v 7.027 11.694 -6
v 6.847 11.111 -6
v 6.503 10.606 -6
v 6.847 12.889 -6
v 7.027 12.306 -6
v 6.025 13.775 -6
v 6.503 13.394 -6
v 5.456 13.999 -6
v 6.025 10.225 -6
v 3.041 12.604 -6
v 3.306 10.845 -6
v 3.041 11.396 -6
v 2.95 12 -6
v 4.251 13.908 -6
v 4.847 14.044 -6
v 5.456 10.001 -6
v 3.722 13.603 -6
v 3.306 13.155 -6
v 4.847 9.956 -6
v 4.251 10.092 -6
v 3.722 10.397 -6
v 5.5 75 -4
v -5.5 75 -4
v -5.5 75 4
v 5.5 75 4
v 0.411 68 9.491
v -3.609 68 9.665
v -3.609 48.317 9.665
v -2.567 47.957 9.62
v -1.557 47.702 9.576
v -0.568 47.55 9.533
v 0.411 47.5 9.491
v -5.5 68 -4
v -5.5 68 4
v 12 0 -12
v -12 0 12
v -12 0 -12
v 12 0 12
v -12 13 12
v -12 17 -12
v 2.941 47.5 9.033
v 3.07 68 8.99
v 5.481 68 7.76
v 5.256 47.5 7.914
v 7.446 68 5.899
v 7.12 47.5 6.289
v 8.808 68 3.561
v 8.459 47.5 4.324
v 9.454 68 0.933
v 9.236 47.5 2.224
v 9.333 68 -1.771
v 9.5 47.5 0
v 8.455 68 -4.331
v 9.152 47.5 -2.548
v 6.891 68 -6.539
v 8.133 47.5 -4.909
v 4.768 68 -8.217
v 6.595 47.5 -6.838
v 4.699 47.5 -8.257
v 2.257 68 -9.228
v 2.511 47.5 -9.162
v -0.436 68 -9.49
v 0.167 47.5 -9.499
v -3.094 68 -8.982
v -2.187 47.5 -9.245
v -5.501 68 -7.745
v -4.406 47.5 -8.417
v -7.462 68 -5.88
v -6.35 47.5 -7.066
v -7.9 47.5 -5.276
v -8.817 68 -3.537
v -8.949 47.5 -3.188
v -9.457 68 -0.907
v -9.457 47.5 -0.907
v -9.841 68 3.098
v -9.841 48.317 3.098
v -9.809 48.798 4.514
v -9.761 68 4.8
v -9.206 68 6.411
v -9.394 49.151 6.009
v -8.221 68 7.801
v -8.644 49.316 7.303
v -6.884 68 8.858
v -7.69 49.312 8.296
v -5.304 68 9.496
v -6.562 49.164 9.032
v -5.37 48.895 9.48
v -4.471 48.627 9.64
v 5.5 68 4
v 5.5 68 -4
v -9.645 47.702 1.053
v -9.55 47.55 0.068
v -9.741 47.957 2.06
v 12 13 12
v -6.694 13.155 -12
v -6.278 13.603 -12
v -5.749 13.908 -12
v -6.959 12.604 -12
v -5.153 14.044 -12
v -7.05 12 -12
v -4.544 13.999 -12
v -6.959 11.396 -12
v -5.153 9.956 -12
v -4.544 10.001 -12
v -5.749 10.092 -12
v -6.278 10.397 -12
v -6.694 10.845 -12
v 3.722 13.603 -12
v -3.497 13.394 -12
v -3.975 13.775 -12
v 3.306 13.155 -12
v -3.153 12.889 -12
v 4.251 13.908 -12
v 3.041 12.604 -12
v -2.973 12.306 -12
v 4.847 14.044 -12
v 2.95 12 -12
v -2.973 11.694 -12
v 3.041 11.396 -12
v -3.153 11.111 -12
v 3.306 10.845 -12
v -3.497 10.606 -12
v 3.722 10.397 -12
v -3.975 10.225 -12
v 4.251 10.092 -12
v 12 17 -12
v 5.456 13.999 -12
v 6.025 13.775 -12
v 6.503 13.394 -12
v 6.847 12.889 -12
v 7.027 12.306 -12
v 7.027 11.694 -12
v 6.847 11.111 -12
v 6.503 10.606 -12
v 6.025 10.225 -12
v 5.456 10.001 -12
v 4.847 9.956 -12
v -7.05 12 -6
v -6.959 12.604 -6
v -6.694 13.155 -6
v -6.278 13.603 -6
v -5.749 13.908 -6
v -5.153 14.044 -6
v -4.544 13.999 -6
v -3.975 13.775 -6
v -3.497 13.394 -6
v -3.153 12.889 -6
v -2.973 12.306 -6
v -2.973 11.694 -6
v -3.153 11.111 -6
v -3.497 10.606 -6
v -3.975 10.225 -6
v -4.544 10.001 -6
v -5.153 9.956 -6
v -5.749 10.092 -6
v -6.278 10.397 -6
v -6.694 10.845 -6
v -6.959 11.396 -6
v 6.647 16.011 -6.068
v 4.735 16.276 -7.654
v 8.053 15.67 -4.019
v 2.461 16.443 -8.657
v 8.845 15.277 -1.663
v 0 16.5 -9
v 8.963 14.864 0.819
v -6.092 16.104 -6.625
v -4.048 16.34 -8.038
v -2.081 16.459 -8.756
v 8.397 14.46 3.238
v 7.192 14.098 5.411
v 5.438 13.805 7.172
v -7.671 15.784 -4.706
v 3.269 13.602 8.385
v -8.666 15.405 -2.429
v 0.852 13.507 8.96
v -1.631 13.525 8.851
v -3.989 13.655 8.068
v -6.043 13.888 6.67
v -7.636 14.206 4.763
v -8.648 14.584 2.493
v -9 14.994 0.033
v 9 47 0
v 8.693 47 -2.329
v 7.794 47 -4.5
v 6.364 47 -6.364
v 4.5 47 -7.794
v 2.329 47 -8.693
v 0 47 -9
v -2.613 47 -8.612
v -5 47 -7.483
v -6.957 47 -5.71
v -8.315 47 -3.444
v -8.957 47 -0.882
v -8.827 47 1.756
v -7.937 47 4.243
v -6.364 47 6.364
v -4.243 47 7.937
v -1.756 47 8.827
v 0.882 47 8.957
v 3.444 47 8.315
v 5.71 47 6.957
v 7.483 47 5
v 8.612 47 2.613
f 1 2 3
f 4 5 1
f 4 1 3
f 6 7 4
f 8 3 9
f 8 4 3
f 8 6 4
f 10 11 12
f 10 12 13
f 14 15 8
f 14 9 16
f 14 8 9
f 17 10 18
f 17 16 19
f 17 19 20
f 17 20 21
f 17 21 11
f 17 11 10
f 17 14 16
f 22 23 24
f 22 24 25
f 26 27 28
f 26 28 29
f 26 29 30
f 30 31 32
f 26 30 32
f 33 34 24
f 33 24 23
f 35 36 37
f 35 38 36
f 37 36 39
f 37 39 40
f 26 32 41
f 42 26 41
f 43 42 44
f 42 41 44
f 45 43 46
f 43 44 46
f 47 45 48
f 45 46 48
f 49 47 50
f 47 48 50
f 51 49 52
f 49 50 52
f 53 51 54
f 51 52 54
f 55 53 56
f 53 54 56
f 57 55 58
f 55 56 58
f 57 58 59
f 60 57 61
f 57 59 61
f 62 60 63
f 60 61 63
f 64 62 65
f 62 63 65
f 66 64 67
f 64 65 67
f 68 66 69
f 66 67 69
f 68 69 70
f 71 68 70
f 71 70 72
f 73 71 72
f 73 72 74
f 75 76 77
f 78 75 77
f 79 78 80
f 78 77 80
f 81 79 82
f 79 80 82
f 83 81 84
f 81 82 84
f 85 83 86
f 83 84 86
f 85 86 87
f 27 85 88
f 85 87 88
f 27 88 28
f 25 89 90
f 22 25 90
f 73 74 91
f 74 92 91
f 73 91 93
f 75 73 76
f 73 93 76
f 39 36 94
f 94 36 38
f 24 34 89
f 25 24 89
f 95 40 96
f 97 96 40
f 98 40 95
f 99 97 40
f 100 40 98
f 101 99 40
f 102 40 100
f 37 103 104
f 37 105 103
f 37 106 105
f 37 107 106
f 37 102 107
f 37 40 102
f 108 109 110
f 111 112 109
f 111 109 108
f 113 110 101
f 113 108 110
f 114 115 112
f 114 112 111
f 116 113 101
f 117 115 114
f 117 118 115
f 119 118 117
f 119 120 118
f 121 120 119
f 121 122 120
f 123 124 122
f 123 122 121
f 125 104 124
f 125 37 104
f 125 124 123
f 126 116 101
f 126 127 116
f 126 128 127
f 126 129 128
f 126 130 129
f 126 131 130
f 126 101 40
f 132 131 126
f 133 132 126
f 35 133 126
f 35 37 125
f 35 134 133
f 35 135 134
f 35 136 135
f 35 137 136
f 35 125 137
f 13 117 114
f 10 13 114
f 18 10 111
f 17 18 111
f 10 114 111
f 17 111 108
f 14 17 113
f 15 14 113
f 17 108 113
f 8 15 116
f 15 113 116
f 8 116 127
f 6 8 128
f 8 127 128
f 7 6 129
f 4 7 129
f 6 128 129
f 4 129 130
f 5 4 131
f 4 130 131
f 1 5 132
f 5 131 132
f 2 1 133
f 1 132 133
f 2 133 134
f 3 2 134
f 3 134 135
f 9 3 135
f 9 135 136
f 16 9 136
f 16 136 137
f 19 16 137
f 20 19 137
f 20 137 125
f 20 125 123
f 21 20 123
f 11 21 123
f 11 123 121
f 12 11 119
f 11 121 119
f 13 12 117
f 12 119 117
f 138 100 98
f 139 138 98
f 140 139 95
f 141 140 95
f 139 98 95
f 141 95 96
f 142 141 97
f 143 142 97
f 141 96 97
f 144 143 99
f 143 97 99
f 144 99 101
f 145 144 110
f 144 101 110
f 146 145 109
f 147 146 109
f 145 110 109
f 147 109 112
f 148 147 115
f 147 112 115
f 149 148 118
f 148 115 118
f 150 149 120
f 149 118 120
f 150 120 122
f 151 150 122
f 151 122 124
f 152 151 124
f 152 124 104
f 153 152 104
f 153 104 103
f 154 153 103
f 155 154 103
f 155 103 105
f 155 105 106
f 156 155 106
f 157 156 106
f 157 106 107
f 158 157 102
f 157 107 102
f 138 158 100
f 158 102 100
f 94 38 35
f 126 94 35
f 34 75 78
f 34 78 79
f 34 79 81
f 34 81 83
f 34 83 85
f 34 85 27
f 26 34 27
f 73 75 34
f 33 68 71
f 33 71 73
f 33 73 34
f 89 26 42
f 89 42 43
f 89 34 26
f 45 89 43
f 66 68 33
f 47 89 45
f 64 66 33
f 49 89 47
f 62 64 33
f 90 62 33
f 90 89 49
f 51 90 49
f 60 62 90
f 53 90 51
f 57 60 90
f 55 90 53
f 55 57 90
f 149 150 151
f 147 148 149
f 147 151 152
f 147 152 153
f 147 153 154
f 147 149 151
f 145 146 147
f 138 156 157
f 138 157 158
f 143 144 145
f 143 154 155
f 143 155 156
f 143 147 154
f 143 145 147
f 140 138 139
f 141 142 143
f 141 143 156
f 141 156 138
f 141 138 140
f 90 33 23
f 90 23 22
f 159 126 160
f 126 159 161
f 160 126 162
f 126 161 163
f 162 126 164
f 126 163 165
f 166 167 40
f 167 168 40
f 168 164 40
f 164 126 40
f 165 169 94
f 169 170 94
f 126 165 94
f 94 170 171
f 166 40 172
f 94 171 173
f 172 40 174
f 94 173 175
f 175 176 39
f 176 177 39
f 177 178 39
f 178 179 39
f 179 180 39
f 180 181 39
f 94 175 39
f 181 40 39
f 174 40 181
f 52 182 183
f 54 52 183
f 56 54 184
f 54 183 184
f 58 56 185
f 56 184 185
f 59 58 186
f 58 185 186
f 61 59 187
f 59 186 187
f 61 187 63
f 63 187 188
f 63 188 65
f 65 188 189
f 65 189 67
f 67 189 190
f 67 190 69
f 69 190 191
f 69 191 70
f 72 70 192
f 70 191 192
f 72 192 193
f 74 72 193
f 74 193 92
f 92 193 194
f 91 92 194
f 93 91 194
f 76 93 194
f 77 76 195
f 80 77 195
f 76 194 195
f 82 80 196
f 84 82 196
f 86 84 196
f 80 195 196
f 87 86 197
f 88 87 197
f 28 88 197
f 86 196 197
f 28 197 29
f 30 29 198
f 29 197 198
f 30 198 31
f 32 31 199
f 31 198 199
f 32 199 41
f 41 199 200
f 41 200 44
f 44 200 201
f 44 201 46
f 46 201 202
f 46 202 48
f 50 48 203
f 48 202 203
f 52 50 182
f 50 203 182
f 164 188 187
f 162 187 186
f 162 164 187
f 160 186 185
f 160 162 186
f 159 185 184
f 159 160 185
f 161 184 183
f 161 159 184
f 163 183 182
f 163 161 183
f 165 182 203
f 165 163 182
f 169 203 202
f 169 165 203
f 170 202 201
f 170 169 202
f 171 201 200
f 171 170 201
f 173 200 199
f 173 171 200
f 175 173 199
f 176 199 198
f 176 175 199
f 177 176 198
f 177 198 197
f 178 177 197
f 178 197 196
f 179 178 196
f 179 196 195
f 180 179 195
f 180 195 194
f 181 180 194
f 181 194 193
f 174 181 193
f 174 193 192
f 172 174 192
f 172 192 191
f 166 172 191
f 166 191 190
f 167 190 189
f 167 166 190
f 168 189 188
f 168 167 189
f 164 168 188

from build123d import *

# Parameters (mm, degrees)
SKETCH1_W           = 24
SKETCH1_H           = 24
BOSS_EXTRUDE1_DEPTH = 17
CUT_EXTRUDE1_DEPTH  = 32.764760349
SKETCH3_R           = 9
BOSS_EXTRUDE2_DEPTH = 52
BOSS_EXTRUDE3_DEPTH = 16
CHAMFER1_START      = 46.9999999
CHAMFER1_OUTLINE_R  = 9
CHAMFER1_DEPTH      = 5.0000001
SKETCH5_W           = 11
SKETCH5_H           = 8
BOSS_EXTRUDE4_DEPTH = 7
SKETCH6_R           = 2.05
CUT_EXTRUDE2_DEPTH  = 6


with BuildPart() as part:
    # Sketch1 → Boss-Extrude1 (new body)
    with BuildSketch(Plane(origin=(0, 0, 0), x_dir=(1, 0, 0), z_dir=(0, 1, 0))):
        Rectangle(SKETCH1_W, SKETCH1_H)
    extrude(amount=BOSS_EXTRUDE1_DEPTH)

    # Sketch2 → Cut-Extrude1 (cut, through all)
    with BuildSketch(Plane.ZY.offset(12)):
        Polygon((-12, 17), (12, 13), (12, 17), align=None)
    extrude(amount=-CUT_EXTRUDE1_DEPTH, mode=Mode.SUBTRACT)

    # Sketch3 → Boss-Extrude2 (add)
    with BuildSketch(Plane.XZ):
        with Locations(Location((0, 0, 0), (0, 0, 270))):
            Circle(SKETCH3_R)
    extrude(amount=-BOSS_EXTRUDE2_DEPTH)

    # Sketch4 → Boss-Extrude3 (add)
    with BuildSketch(Plane(origin=(0, 52, 0), x_dir=(1, 0, 0), z_dir=(0, 1, 0))):
        with BuildLine():
            Line((-9.456572951, 0.90731914), (-9.84083402, -3.097658461))
            ThreePointArc((-9.84083402, -3.097658461), (-8.220587121, -7.800746053), (-3.608813676, -9.665090067))
            Line((-3.608813676, -9.665090067), (0.410792593, -9.491114236))
            ThreePointArc((0.410792593, -9.491114236), (6.891182028, 6.539236214), (-9.456572951, 0.90731914))
        make_face()
    extrude(amount=BOSS_EXTRUDE3_DEPTH)

    # Chamfer1: read off the stored shape, not the designer's step
    # Chamfer1 outline → Chamfer1 (add)
    with BuildSketch(Plane(origin=(0, 0, 0), x_dir=(1, 0, 0), z_dir=(0, 1, 0)).offset(CHAMFER1_START)):
        with BuildLine():
            ThreePointArc((-9.84083402, -3.097658461), (-8.220587121, -7.800746053), (-3.608813676, -9.665090067))
            Line((-3.608813676, -9.665090067), (0.410792593, -9.491114236))
            ThreePointArc((0.410792593, -9.491114236), (6.891182028, 6.539236214), (-9.456572951, 0.90731914))
            Line((-9.456572951, 0.90731914), (-9.84083402, -3.097658461))
        make_face()
        Circle(CHAMFER1_OUTLINE_R, mode=Mode.SUBTRACT)
    extrude(amount=CHAMFER1_DEPTH)

    # Chamfer1 2 outline → Chamfer1 2 (revolve, cut)
    with BuildSketch(Plane.XY):
        Polygon((11.332682454, 49.332682454), (9, 47), (11.332682454, 46.9999999), align=None)
    revolve(axis=Axis((0, 0, 0), (0, 1, 0)), mode=Mode.SUBTRACT)

    # Sketch5 → Boss-Extrude4 (add)
    with BuildSketch(Plane(origin=(0, 68, 0), x_dir=(1, 0, 0), z_dir=(0, 1, 0))):
        Rectangle(SKETCH5_W, SKETCH5_H)
    extrude(amount=BOSS_EXTRUDE4_DEPTH)

    # Sketch6 → Cut-Extrude2 (cut)
    with BuildSketch(Plane(origin=(0, 0, -12), x_dir=(-1, 0, 0), z_dir=(0, 0, -1))):
        with Locations((5, 12)):
            Circle(SKETCH6_R)
        with Locations((-5, 12)):
            Circle(SKETCH6_R)
    extrude(amount=-CUT_EXTRUDE2_DEPTH, mode=Mode.SUBTRACT)


solid = part.part
